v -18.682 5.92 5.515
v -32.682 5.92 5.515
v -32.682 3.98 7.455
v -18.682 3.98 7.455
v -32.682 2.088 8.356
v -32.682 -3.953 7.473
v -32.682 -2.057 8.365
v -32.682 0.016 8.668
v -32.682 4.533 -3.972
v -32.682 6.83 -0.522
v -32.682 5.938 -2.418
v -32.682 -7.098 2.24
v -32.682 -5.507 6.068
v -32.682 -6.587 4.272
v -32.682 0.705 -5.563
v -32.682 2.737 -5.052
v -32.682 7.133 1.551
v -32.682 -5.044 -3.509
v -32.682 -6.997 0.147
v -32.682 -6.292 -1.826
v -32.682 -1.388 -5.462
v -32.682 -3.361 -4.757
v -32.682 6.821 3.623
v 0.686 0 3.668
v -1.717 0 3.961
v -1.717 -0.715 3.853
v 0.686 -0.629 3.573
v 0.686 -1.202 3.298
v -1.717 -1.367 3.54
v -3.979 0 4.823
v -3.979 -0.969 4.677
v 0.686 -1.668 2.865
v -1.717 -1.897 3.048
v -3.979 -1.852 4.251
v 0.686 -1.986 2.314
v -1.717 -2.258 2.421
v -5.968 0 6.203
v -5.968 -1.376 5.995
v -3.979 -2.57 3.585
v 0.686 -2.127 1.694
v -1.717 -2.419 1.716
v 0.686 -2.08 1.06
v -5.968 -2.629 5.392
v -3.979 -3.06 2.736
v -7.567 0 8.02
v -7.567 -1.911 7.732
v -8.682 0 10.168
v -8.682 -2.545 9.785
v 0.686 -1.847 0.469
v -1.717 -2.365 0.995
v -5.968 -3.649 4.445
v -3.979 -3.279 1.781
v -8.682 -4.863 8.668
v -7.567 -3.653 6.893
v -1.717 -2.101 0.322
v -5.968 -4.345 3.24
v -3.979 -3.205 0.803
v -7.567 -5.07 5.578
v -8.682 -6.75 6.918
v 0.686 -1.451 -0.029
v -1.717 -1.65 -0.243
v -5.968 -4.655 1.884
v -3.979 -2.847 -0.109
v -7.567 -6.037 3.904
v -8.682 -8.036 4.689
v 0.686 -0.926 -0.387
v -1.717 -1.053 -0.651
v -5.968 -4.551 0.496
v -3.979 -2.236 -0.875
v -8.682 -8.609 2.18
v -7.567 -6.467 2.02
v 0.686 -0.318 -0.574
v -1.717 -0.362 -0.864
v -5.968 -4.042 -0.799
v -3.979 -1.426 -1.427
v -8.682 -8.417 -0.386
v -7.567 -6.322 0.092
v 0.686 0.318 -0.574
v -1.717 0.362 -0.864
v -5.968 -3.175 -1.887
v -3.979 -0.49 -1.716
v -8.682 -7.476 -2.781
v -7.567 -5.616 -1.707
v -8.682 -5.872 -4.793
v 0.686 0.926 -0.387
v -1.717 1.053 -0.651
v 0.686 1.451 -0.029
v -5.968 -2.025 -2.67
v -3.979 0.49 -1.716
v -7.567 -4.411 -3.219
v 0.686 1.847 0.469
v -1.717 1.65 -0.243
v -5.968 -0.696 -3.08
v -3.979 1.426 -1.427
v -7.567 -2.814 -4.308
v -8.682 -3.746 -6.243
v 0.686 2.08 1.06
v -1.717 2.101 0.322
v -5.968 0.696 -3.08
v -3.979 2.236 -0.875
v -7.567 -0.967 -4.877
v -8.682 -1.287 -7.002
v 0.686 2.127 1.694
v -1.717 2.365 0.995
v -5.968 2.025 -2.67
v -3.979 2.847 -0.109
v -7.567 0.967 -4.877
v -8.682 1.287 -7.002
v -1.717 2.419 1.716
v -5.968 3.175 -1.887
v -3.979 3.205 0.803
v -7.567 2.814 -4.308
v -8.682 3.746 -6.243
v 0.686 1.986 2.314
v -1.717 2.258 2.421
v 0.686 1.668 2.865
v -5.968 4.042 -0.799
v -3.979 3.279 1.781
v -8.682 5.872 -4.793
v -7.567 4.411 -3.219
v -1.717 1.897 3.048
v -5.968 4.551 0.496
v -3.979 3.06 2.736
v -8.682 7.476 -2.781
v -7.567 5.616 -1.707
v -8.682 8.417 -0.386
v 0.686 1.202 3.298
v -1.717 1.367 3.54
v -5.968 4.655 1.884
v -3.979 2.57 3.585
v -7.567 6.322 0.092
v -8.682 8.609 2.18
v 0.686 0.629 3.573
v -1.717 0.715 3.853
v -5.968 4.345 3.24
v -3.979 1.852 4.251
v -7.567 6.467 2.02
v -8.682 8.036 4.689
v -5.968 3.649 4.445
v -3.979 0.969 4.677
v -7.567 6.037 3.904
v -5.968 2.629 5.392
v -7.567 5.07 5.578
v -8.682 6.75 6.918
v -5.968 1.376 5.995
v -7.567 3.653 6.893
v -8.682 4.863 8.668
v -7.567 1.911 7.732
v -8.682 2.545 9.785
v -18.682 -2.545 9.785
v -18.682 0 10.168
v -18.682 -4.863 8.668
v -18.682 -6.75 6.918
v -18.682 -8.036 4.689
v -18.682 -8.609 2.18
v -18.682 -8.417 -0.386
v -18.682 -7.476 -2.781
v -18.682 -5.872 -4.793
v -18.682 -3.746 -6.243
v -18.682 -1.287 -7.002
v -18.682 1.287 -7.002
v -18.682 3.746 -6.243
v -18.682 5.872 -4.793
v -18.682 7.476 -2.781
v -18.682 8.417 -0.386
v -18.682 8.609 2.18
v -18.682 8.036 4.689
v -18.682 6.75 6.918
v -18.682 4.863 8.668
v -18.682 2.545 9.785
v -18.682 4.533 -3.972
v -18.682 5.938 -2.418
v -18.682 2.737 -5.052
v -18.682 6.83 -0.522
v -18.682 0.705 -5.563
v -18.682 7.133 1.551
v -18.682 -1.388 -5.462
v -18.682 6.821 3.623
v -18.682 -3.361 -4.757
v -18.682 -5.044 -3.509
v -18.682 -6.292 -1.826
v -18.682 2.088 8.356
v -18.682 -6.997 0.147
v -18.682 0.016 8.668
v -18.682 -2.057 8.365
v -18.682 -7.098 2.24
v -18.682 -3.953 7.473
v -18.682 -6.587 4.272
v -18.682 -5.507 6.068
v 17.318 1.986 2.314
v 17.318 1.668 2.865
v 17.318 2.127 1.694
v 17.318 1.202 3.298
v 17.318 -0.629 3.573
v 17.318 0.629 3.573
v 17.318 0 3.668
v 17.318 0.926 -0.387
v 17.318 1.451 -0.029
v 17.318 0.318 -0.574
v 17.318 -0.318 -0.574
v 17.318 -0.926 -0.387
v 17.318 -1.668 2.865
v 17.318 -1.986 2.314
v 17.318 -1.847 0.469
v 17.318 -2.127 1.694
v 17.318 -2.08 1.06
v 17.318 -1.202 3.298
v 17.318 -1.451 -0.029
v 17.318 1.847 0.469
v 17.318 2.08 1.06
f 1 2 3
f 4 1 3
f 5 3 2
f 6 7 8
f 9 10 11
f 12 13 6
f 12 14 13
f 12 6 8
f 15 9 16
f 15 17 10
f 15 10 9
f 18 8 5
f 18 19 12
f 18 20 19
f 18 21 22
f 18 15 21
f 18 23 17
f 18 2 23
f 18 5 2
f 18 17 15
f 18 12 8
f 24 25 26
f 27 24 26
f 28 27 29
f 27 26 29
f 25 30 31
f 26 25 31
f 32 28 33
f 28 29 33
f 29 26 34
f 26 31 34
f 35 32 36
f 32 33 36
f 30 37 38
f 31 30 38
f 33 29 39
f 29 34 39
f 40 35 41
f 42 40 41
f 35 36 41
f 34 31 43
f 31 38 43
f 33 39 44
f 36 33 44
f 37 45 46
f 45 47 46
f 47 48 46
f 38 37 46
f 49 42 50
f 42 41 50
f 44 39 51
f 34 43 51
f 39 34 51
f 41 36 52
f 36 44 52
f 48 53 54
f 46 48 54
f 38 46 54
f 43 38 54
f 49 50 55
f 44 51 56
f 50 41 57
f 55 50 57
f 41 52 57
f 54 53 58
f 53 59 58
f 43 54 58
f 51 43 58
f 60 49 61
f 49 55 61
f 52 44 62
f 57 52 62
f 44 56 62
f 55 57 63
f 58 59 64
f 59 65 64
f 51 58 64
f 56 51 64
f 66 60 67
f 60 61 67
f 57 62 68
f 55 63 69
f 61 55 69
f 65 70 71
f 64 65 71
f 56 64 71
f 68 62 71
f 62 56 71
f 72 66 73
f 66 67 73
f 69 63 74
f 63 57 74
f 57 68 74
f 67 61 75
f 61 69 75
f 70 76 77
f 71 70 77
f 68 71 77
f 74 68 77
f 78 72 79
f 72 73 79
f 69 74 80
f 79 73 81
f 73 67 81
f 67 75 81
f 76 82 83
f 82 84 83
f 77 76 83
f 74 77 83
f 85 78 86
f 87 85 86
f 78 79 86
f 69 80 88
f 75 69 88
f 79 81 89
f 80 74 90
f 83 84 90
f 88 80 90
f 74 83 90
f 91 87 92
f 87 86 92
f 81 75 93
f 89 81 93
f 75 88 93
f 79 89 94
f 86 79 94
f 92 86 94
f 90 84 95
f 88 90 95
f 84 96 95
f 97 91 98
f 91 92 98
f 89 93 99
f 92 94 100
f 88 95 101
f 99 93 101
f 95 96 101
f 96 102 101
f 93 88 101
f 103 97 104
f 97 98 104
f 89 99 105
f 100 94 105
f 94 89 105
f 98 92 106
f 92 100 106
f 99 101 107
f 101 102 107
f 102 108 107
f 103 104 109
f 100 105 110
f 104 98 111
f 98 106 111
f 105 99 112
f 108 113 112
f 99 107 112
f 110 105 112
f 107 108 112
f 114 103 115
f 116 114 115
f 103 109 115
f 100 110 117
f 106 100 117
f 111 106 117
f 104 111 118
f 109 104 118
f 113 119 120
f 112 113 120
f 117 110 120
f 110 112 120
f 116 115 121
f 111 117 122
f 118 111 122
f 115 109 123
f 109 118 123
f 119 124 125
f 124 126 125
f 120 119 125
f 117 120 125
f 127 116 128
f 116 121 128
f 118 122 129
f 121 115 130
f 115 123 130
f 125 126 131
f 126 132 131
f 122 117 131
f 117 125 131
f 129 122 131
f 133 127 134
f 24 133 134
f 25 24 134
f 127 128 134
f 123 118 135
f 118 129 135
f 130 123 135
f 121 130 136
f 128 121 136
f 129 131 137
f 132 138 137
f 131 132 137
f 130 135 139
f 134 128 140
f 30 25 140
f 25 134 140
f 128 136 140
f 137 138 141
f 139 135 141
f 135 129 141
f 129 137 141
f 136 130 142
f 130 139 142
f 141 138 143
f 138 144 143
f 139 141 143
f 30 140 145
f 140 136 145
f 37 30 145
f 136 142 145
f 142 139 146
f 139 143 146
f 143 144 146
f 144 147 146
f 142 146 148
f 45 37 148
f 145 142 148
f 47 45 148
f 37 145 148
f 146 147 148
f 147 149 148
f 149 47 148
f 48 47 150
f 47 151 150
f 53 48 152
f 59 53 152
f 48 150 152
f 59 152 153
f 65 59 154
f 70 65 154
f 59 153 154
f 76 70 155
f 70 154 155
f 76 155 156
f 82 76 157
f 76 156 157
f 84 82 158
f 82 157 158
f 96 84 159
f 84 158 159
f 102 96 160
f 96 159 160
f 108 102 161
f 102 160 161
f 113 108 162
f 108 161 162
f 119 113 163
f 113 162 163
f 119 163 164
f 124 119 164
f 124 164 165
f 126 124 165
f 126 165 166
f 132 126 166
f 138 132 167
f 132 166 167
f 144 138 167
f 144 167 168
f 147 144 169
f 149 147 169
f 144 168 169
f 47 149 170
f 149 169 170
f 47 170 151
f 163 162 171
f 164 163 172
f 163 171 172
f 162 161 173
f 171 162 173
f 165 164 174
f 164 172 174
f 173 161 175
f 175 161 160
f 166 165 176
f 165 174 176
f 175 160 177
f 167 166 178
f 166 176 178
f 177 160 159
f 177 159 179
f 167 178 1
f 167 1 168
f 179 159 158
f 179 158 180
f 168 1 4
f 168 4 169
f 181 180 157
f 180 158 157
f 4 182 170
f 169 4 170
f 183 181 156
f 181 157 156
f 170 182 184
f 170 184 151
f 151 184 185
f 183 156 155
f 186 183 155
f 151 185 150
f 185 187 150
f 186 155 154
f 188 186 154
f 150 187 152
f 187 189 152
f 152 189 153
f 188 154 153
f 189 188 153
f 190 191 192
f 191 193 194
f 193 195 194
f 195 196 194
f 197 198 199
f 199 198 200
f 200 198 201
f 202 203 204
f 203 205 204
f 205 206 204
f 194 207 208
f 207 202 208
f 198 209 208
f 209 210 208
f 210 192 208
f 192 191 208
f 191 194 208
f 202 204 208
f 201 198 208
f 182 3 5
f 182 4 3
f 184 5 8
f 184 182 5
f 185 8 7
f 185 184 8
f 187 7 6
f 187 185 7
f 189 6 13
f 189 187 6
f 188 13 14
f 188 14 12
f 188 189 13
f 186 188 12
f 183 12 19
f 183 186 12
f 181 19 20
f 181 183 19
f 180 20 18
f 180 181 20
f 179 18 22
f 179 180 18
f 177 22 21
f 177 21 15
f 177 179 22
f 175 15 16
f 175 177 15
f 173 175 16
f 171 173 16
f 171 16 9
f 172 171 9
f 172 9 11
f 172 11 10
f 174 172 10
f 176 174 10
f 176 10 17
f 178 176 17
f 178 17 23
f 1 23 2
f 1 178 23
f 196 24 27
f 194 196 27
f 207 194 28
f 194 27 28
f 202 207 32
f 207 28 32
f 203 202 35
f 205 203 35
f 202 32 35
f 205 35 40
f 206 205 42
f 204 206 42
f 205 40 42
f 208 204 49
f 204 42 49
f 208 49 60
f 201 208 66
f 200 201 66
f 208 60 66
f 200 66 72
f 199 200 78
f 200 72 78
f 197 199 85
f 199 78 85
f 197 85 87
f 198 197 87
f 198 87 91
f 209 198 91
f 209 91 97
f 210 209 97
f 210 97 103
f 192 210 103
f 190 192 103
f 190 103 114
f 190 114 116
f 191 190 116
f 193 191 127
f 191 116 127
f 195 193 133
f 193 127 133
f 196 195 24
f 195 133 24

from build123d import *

# Parameters (mm, degrees)
SKETCH_1_W          = 14
SKETCH_1_H          = 7.133094656938376
FILLET_1_R          = 10
CUT_EXTRUDE_1_DEPTH = 14


with BuildPart() as part:
    # 草图1 → 旋转1 (revolve)
    with BuildSketch(Plane(origin=(0, 0, 0), x_dir=(1, 0, 0), z_dir=(0, 1, 0)), mode=Mode.PRIVATE) as revolve_1_sk:
        with Locations((-25.681968733439298, 2.0314918872170904)):
            Rectangle(SKETCH_1_W, SKETCH_1_H)
        Polygon((-18.681968733439298, 5.598039215686279), (-18.681968733439298, -1.535055441252097), (-8.681968733439298, -1.5350554412520978), (-8.681968733439302, 0.5980392156862795), (-8.681968733439302, 7.098039215686279), (-18.681968733439298, 7.098039215686279), align=None)
        Polygon((-8.681968733439302, 0.5980392156862795), (-8.681968733439302, -1.535055441252097), (17.318031266560702, -1.5350554412520978), (17.318031266560705, 0.5980392156862795), align=None)
    revolve(revolve_1_sk.sketch.rotate(Axis((-32.6819687334393, 0, 1.5350554412520978), (1, 0, 0)), 180), axis=Axis((-32.6819687334393, 0, 1.5350554412520978), (1, 0, 0)))

    # 圆角1
    # the kernel refuses this fillet: 10 mm, written as the material it adds along each edge
    with BuildSketch(Plane(origin=(-8.681968733439302, 0, 1.5350554412520978), x_dir=(0, 1.2e-16, 1), z_dir=(0, 1, -1.2e-16))) as fillet_1_piece_1:
        with BuildLine():
            CenterArc((12.133094656938377, 9.367496997597598), FILLET_1_R, 180, 69.51268488527734)
            Line((2.1330946569383773, 9.367496997597598), (1.9330946569383771, 9.367496997597598))
            Line((1.9330946569383771, 9.367496997597598), (1.9330946569383771, 0))
            Line((1.9330946569383771, 0), (2.1330946569383773, -0.1999999999999993))
            ThreePointArc((2.1330946569383773, -0.1999999999999993), (5.383094656938376, -0.1999999999999993), (8.563094656938375, -0.18734993995195026))
            Line((8.563094656938375, -0.18734993995195026), (8.633094656938376, 1.78e-15))
        make_face()
    revolve(axis=Axis((-8.681968733439302, 0, 1.5350554412520978), (1, 0, 0)))

    # 草图2 → 切除-拉伸-薄壁1 (cut)
    with BuildSketch(Plane.ZY.offset(32.6819687334393)):
        Polygon((5.514998964205359, 5.919551413658403), (7.454606854910501, 3.979943522953262), (14.525674666775975, 11.051011334818739), (12.586066776070833, 12.99061922552388), align=None)
    extrude(amount=-CUT_EXTRUDE_1_DEPTH, mode=Mode.SUBTRACT)


solid = part.part
